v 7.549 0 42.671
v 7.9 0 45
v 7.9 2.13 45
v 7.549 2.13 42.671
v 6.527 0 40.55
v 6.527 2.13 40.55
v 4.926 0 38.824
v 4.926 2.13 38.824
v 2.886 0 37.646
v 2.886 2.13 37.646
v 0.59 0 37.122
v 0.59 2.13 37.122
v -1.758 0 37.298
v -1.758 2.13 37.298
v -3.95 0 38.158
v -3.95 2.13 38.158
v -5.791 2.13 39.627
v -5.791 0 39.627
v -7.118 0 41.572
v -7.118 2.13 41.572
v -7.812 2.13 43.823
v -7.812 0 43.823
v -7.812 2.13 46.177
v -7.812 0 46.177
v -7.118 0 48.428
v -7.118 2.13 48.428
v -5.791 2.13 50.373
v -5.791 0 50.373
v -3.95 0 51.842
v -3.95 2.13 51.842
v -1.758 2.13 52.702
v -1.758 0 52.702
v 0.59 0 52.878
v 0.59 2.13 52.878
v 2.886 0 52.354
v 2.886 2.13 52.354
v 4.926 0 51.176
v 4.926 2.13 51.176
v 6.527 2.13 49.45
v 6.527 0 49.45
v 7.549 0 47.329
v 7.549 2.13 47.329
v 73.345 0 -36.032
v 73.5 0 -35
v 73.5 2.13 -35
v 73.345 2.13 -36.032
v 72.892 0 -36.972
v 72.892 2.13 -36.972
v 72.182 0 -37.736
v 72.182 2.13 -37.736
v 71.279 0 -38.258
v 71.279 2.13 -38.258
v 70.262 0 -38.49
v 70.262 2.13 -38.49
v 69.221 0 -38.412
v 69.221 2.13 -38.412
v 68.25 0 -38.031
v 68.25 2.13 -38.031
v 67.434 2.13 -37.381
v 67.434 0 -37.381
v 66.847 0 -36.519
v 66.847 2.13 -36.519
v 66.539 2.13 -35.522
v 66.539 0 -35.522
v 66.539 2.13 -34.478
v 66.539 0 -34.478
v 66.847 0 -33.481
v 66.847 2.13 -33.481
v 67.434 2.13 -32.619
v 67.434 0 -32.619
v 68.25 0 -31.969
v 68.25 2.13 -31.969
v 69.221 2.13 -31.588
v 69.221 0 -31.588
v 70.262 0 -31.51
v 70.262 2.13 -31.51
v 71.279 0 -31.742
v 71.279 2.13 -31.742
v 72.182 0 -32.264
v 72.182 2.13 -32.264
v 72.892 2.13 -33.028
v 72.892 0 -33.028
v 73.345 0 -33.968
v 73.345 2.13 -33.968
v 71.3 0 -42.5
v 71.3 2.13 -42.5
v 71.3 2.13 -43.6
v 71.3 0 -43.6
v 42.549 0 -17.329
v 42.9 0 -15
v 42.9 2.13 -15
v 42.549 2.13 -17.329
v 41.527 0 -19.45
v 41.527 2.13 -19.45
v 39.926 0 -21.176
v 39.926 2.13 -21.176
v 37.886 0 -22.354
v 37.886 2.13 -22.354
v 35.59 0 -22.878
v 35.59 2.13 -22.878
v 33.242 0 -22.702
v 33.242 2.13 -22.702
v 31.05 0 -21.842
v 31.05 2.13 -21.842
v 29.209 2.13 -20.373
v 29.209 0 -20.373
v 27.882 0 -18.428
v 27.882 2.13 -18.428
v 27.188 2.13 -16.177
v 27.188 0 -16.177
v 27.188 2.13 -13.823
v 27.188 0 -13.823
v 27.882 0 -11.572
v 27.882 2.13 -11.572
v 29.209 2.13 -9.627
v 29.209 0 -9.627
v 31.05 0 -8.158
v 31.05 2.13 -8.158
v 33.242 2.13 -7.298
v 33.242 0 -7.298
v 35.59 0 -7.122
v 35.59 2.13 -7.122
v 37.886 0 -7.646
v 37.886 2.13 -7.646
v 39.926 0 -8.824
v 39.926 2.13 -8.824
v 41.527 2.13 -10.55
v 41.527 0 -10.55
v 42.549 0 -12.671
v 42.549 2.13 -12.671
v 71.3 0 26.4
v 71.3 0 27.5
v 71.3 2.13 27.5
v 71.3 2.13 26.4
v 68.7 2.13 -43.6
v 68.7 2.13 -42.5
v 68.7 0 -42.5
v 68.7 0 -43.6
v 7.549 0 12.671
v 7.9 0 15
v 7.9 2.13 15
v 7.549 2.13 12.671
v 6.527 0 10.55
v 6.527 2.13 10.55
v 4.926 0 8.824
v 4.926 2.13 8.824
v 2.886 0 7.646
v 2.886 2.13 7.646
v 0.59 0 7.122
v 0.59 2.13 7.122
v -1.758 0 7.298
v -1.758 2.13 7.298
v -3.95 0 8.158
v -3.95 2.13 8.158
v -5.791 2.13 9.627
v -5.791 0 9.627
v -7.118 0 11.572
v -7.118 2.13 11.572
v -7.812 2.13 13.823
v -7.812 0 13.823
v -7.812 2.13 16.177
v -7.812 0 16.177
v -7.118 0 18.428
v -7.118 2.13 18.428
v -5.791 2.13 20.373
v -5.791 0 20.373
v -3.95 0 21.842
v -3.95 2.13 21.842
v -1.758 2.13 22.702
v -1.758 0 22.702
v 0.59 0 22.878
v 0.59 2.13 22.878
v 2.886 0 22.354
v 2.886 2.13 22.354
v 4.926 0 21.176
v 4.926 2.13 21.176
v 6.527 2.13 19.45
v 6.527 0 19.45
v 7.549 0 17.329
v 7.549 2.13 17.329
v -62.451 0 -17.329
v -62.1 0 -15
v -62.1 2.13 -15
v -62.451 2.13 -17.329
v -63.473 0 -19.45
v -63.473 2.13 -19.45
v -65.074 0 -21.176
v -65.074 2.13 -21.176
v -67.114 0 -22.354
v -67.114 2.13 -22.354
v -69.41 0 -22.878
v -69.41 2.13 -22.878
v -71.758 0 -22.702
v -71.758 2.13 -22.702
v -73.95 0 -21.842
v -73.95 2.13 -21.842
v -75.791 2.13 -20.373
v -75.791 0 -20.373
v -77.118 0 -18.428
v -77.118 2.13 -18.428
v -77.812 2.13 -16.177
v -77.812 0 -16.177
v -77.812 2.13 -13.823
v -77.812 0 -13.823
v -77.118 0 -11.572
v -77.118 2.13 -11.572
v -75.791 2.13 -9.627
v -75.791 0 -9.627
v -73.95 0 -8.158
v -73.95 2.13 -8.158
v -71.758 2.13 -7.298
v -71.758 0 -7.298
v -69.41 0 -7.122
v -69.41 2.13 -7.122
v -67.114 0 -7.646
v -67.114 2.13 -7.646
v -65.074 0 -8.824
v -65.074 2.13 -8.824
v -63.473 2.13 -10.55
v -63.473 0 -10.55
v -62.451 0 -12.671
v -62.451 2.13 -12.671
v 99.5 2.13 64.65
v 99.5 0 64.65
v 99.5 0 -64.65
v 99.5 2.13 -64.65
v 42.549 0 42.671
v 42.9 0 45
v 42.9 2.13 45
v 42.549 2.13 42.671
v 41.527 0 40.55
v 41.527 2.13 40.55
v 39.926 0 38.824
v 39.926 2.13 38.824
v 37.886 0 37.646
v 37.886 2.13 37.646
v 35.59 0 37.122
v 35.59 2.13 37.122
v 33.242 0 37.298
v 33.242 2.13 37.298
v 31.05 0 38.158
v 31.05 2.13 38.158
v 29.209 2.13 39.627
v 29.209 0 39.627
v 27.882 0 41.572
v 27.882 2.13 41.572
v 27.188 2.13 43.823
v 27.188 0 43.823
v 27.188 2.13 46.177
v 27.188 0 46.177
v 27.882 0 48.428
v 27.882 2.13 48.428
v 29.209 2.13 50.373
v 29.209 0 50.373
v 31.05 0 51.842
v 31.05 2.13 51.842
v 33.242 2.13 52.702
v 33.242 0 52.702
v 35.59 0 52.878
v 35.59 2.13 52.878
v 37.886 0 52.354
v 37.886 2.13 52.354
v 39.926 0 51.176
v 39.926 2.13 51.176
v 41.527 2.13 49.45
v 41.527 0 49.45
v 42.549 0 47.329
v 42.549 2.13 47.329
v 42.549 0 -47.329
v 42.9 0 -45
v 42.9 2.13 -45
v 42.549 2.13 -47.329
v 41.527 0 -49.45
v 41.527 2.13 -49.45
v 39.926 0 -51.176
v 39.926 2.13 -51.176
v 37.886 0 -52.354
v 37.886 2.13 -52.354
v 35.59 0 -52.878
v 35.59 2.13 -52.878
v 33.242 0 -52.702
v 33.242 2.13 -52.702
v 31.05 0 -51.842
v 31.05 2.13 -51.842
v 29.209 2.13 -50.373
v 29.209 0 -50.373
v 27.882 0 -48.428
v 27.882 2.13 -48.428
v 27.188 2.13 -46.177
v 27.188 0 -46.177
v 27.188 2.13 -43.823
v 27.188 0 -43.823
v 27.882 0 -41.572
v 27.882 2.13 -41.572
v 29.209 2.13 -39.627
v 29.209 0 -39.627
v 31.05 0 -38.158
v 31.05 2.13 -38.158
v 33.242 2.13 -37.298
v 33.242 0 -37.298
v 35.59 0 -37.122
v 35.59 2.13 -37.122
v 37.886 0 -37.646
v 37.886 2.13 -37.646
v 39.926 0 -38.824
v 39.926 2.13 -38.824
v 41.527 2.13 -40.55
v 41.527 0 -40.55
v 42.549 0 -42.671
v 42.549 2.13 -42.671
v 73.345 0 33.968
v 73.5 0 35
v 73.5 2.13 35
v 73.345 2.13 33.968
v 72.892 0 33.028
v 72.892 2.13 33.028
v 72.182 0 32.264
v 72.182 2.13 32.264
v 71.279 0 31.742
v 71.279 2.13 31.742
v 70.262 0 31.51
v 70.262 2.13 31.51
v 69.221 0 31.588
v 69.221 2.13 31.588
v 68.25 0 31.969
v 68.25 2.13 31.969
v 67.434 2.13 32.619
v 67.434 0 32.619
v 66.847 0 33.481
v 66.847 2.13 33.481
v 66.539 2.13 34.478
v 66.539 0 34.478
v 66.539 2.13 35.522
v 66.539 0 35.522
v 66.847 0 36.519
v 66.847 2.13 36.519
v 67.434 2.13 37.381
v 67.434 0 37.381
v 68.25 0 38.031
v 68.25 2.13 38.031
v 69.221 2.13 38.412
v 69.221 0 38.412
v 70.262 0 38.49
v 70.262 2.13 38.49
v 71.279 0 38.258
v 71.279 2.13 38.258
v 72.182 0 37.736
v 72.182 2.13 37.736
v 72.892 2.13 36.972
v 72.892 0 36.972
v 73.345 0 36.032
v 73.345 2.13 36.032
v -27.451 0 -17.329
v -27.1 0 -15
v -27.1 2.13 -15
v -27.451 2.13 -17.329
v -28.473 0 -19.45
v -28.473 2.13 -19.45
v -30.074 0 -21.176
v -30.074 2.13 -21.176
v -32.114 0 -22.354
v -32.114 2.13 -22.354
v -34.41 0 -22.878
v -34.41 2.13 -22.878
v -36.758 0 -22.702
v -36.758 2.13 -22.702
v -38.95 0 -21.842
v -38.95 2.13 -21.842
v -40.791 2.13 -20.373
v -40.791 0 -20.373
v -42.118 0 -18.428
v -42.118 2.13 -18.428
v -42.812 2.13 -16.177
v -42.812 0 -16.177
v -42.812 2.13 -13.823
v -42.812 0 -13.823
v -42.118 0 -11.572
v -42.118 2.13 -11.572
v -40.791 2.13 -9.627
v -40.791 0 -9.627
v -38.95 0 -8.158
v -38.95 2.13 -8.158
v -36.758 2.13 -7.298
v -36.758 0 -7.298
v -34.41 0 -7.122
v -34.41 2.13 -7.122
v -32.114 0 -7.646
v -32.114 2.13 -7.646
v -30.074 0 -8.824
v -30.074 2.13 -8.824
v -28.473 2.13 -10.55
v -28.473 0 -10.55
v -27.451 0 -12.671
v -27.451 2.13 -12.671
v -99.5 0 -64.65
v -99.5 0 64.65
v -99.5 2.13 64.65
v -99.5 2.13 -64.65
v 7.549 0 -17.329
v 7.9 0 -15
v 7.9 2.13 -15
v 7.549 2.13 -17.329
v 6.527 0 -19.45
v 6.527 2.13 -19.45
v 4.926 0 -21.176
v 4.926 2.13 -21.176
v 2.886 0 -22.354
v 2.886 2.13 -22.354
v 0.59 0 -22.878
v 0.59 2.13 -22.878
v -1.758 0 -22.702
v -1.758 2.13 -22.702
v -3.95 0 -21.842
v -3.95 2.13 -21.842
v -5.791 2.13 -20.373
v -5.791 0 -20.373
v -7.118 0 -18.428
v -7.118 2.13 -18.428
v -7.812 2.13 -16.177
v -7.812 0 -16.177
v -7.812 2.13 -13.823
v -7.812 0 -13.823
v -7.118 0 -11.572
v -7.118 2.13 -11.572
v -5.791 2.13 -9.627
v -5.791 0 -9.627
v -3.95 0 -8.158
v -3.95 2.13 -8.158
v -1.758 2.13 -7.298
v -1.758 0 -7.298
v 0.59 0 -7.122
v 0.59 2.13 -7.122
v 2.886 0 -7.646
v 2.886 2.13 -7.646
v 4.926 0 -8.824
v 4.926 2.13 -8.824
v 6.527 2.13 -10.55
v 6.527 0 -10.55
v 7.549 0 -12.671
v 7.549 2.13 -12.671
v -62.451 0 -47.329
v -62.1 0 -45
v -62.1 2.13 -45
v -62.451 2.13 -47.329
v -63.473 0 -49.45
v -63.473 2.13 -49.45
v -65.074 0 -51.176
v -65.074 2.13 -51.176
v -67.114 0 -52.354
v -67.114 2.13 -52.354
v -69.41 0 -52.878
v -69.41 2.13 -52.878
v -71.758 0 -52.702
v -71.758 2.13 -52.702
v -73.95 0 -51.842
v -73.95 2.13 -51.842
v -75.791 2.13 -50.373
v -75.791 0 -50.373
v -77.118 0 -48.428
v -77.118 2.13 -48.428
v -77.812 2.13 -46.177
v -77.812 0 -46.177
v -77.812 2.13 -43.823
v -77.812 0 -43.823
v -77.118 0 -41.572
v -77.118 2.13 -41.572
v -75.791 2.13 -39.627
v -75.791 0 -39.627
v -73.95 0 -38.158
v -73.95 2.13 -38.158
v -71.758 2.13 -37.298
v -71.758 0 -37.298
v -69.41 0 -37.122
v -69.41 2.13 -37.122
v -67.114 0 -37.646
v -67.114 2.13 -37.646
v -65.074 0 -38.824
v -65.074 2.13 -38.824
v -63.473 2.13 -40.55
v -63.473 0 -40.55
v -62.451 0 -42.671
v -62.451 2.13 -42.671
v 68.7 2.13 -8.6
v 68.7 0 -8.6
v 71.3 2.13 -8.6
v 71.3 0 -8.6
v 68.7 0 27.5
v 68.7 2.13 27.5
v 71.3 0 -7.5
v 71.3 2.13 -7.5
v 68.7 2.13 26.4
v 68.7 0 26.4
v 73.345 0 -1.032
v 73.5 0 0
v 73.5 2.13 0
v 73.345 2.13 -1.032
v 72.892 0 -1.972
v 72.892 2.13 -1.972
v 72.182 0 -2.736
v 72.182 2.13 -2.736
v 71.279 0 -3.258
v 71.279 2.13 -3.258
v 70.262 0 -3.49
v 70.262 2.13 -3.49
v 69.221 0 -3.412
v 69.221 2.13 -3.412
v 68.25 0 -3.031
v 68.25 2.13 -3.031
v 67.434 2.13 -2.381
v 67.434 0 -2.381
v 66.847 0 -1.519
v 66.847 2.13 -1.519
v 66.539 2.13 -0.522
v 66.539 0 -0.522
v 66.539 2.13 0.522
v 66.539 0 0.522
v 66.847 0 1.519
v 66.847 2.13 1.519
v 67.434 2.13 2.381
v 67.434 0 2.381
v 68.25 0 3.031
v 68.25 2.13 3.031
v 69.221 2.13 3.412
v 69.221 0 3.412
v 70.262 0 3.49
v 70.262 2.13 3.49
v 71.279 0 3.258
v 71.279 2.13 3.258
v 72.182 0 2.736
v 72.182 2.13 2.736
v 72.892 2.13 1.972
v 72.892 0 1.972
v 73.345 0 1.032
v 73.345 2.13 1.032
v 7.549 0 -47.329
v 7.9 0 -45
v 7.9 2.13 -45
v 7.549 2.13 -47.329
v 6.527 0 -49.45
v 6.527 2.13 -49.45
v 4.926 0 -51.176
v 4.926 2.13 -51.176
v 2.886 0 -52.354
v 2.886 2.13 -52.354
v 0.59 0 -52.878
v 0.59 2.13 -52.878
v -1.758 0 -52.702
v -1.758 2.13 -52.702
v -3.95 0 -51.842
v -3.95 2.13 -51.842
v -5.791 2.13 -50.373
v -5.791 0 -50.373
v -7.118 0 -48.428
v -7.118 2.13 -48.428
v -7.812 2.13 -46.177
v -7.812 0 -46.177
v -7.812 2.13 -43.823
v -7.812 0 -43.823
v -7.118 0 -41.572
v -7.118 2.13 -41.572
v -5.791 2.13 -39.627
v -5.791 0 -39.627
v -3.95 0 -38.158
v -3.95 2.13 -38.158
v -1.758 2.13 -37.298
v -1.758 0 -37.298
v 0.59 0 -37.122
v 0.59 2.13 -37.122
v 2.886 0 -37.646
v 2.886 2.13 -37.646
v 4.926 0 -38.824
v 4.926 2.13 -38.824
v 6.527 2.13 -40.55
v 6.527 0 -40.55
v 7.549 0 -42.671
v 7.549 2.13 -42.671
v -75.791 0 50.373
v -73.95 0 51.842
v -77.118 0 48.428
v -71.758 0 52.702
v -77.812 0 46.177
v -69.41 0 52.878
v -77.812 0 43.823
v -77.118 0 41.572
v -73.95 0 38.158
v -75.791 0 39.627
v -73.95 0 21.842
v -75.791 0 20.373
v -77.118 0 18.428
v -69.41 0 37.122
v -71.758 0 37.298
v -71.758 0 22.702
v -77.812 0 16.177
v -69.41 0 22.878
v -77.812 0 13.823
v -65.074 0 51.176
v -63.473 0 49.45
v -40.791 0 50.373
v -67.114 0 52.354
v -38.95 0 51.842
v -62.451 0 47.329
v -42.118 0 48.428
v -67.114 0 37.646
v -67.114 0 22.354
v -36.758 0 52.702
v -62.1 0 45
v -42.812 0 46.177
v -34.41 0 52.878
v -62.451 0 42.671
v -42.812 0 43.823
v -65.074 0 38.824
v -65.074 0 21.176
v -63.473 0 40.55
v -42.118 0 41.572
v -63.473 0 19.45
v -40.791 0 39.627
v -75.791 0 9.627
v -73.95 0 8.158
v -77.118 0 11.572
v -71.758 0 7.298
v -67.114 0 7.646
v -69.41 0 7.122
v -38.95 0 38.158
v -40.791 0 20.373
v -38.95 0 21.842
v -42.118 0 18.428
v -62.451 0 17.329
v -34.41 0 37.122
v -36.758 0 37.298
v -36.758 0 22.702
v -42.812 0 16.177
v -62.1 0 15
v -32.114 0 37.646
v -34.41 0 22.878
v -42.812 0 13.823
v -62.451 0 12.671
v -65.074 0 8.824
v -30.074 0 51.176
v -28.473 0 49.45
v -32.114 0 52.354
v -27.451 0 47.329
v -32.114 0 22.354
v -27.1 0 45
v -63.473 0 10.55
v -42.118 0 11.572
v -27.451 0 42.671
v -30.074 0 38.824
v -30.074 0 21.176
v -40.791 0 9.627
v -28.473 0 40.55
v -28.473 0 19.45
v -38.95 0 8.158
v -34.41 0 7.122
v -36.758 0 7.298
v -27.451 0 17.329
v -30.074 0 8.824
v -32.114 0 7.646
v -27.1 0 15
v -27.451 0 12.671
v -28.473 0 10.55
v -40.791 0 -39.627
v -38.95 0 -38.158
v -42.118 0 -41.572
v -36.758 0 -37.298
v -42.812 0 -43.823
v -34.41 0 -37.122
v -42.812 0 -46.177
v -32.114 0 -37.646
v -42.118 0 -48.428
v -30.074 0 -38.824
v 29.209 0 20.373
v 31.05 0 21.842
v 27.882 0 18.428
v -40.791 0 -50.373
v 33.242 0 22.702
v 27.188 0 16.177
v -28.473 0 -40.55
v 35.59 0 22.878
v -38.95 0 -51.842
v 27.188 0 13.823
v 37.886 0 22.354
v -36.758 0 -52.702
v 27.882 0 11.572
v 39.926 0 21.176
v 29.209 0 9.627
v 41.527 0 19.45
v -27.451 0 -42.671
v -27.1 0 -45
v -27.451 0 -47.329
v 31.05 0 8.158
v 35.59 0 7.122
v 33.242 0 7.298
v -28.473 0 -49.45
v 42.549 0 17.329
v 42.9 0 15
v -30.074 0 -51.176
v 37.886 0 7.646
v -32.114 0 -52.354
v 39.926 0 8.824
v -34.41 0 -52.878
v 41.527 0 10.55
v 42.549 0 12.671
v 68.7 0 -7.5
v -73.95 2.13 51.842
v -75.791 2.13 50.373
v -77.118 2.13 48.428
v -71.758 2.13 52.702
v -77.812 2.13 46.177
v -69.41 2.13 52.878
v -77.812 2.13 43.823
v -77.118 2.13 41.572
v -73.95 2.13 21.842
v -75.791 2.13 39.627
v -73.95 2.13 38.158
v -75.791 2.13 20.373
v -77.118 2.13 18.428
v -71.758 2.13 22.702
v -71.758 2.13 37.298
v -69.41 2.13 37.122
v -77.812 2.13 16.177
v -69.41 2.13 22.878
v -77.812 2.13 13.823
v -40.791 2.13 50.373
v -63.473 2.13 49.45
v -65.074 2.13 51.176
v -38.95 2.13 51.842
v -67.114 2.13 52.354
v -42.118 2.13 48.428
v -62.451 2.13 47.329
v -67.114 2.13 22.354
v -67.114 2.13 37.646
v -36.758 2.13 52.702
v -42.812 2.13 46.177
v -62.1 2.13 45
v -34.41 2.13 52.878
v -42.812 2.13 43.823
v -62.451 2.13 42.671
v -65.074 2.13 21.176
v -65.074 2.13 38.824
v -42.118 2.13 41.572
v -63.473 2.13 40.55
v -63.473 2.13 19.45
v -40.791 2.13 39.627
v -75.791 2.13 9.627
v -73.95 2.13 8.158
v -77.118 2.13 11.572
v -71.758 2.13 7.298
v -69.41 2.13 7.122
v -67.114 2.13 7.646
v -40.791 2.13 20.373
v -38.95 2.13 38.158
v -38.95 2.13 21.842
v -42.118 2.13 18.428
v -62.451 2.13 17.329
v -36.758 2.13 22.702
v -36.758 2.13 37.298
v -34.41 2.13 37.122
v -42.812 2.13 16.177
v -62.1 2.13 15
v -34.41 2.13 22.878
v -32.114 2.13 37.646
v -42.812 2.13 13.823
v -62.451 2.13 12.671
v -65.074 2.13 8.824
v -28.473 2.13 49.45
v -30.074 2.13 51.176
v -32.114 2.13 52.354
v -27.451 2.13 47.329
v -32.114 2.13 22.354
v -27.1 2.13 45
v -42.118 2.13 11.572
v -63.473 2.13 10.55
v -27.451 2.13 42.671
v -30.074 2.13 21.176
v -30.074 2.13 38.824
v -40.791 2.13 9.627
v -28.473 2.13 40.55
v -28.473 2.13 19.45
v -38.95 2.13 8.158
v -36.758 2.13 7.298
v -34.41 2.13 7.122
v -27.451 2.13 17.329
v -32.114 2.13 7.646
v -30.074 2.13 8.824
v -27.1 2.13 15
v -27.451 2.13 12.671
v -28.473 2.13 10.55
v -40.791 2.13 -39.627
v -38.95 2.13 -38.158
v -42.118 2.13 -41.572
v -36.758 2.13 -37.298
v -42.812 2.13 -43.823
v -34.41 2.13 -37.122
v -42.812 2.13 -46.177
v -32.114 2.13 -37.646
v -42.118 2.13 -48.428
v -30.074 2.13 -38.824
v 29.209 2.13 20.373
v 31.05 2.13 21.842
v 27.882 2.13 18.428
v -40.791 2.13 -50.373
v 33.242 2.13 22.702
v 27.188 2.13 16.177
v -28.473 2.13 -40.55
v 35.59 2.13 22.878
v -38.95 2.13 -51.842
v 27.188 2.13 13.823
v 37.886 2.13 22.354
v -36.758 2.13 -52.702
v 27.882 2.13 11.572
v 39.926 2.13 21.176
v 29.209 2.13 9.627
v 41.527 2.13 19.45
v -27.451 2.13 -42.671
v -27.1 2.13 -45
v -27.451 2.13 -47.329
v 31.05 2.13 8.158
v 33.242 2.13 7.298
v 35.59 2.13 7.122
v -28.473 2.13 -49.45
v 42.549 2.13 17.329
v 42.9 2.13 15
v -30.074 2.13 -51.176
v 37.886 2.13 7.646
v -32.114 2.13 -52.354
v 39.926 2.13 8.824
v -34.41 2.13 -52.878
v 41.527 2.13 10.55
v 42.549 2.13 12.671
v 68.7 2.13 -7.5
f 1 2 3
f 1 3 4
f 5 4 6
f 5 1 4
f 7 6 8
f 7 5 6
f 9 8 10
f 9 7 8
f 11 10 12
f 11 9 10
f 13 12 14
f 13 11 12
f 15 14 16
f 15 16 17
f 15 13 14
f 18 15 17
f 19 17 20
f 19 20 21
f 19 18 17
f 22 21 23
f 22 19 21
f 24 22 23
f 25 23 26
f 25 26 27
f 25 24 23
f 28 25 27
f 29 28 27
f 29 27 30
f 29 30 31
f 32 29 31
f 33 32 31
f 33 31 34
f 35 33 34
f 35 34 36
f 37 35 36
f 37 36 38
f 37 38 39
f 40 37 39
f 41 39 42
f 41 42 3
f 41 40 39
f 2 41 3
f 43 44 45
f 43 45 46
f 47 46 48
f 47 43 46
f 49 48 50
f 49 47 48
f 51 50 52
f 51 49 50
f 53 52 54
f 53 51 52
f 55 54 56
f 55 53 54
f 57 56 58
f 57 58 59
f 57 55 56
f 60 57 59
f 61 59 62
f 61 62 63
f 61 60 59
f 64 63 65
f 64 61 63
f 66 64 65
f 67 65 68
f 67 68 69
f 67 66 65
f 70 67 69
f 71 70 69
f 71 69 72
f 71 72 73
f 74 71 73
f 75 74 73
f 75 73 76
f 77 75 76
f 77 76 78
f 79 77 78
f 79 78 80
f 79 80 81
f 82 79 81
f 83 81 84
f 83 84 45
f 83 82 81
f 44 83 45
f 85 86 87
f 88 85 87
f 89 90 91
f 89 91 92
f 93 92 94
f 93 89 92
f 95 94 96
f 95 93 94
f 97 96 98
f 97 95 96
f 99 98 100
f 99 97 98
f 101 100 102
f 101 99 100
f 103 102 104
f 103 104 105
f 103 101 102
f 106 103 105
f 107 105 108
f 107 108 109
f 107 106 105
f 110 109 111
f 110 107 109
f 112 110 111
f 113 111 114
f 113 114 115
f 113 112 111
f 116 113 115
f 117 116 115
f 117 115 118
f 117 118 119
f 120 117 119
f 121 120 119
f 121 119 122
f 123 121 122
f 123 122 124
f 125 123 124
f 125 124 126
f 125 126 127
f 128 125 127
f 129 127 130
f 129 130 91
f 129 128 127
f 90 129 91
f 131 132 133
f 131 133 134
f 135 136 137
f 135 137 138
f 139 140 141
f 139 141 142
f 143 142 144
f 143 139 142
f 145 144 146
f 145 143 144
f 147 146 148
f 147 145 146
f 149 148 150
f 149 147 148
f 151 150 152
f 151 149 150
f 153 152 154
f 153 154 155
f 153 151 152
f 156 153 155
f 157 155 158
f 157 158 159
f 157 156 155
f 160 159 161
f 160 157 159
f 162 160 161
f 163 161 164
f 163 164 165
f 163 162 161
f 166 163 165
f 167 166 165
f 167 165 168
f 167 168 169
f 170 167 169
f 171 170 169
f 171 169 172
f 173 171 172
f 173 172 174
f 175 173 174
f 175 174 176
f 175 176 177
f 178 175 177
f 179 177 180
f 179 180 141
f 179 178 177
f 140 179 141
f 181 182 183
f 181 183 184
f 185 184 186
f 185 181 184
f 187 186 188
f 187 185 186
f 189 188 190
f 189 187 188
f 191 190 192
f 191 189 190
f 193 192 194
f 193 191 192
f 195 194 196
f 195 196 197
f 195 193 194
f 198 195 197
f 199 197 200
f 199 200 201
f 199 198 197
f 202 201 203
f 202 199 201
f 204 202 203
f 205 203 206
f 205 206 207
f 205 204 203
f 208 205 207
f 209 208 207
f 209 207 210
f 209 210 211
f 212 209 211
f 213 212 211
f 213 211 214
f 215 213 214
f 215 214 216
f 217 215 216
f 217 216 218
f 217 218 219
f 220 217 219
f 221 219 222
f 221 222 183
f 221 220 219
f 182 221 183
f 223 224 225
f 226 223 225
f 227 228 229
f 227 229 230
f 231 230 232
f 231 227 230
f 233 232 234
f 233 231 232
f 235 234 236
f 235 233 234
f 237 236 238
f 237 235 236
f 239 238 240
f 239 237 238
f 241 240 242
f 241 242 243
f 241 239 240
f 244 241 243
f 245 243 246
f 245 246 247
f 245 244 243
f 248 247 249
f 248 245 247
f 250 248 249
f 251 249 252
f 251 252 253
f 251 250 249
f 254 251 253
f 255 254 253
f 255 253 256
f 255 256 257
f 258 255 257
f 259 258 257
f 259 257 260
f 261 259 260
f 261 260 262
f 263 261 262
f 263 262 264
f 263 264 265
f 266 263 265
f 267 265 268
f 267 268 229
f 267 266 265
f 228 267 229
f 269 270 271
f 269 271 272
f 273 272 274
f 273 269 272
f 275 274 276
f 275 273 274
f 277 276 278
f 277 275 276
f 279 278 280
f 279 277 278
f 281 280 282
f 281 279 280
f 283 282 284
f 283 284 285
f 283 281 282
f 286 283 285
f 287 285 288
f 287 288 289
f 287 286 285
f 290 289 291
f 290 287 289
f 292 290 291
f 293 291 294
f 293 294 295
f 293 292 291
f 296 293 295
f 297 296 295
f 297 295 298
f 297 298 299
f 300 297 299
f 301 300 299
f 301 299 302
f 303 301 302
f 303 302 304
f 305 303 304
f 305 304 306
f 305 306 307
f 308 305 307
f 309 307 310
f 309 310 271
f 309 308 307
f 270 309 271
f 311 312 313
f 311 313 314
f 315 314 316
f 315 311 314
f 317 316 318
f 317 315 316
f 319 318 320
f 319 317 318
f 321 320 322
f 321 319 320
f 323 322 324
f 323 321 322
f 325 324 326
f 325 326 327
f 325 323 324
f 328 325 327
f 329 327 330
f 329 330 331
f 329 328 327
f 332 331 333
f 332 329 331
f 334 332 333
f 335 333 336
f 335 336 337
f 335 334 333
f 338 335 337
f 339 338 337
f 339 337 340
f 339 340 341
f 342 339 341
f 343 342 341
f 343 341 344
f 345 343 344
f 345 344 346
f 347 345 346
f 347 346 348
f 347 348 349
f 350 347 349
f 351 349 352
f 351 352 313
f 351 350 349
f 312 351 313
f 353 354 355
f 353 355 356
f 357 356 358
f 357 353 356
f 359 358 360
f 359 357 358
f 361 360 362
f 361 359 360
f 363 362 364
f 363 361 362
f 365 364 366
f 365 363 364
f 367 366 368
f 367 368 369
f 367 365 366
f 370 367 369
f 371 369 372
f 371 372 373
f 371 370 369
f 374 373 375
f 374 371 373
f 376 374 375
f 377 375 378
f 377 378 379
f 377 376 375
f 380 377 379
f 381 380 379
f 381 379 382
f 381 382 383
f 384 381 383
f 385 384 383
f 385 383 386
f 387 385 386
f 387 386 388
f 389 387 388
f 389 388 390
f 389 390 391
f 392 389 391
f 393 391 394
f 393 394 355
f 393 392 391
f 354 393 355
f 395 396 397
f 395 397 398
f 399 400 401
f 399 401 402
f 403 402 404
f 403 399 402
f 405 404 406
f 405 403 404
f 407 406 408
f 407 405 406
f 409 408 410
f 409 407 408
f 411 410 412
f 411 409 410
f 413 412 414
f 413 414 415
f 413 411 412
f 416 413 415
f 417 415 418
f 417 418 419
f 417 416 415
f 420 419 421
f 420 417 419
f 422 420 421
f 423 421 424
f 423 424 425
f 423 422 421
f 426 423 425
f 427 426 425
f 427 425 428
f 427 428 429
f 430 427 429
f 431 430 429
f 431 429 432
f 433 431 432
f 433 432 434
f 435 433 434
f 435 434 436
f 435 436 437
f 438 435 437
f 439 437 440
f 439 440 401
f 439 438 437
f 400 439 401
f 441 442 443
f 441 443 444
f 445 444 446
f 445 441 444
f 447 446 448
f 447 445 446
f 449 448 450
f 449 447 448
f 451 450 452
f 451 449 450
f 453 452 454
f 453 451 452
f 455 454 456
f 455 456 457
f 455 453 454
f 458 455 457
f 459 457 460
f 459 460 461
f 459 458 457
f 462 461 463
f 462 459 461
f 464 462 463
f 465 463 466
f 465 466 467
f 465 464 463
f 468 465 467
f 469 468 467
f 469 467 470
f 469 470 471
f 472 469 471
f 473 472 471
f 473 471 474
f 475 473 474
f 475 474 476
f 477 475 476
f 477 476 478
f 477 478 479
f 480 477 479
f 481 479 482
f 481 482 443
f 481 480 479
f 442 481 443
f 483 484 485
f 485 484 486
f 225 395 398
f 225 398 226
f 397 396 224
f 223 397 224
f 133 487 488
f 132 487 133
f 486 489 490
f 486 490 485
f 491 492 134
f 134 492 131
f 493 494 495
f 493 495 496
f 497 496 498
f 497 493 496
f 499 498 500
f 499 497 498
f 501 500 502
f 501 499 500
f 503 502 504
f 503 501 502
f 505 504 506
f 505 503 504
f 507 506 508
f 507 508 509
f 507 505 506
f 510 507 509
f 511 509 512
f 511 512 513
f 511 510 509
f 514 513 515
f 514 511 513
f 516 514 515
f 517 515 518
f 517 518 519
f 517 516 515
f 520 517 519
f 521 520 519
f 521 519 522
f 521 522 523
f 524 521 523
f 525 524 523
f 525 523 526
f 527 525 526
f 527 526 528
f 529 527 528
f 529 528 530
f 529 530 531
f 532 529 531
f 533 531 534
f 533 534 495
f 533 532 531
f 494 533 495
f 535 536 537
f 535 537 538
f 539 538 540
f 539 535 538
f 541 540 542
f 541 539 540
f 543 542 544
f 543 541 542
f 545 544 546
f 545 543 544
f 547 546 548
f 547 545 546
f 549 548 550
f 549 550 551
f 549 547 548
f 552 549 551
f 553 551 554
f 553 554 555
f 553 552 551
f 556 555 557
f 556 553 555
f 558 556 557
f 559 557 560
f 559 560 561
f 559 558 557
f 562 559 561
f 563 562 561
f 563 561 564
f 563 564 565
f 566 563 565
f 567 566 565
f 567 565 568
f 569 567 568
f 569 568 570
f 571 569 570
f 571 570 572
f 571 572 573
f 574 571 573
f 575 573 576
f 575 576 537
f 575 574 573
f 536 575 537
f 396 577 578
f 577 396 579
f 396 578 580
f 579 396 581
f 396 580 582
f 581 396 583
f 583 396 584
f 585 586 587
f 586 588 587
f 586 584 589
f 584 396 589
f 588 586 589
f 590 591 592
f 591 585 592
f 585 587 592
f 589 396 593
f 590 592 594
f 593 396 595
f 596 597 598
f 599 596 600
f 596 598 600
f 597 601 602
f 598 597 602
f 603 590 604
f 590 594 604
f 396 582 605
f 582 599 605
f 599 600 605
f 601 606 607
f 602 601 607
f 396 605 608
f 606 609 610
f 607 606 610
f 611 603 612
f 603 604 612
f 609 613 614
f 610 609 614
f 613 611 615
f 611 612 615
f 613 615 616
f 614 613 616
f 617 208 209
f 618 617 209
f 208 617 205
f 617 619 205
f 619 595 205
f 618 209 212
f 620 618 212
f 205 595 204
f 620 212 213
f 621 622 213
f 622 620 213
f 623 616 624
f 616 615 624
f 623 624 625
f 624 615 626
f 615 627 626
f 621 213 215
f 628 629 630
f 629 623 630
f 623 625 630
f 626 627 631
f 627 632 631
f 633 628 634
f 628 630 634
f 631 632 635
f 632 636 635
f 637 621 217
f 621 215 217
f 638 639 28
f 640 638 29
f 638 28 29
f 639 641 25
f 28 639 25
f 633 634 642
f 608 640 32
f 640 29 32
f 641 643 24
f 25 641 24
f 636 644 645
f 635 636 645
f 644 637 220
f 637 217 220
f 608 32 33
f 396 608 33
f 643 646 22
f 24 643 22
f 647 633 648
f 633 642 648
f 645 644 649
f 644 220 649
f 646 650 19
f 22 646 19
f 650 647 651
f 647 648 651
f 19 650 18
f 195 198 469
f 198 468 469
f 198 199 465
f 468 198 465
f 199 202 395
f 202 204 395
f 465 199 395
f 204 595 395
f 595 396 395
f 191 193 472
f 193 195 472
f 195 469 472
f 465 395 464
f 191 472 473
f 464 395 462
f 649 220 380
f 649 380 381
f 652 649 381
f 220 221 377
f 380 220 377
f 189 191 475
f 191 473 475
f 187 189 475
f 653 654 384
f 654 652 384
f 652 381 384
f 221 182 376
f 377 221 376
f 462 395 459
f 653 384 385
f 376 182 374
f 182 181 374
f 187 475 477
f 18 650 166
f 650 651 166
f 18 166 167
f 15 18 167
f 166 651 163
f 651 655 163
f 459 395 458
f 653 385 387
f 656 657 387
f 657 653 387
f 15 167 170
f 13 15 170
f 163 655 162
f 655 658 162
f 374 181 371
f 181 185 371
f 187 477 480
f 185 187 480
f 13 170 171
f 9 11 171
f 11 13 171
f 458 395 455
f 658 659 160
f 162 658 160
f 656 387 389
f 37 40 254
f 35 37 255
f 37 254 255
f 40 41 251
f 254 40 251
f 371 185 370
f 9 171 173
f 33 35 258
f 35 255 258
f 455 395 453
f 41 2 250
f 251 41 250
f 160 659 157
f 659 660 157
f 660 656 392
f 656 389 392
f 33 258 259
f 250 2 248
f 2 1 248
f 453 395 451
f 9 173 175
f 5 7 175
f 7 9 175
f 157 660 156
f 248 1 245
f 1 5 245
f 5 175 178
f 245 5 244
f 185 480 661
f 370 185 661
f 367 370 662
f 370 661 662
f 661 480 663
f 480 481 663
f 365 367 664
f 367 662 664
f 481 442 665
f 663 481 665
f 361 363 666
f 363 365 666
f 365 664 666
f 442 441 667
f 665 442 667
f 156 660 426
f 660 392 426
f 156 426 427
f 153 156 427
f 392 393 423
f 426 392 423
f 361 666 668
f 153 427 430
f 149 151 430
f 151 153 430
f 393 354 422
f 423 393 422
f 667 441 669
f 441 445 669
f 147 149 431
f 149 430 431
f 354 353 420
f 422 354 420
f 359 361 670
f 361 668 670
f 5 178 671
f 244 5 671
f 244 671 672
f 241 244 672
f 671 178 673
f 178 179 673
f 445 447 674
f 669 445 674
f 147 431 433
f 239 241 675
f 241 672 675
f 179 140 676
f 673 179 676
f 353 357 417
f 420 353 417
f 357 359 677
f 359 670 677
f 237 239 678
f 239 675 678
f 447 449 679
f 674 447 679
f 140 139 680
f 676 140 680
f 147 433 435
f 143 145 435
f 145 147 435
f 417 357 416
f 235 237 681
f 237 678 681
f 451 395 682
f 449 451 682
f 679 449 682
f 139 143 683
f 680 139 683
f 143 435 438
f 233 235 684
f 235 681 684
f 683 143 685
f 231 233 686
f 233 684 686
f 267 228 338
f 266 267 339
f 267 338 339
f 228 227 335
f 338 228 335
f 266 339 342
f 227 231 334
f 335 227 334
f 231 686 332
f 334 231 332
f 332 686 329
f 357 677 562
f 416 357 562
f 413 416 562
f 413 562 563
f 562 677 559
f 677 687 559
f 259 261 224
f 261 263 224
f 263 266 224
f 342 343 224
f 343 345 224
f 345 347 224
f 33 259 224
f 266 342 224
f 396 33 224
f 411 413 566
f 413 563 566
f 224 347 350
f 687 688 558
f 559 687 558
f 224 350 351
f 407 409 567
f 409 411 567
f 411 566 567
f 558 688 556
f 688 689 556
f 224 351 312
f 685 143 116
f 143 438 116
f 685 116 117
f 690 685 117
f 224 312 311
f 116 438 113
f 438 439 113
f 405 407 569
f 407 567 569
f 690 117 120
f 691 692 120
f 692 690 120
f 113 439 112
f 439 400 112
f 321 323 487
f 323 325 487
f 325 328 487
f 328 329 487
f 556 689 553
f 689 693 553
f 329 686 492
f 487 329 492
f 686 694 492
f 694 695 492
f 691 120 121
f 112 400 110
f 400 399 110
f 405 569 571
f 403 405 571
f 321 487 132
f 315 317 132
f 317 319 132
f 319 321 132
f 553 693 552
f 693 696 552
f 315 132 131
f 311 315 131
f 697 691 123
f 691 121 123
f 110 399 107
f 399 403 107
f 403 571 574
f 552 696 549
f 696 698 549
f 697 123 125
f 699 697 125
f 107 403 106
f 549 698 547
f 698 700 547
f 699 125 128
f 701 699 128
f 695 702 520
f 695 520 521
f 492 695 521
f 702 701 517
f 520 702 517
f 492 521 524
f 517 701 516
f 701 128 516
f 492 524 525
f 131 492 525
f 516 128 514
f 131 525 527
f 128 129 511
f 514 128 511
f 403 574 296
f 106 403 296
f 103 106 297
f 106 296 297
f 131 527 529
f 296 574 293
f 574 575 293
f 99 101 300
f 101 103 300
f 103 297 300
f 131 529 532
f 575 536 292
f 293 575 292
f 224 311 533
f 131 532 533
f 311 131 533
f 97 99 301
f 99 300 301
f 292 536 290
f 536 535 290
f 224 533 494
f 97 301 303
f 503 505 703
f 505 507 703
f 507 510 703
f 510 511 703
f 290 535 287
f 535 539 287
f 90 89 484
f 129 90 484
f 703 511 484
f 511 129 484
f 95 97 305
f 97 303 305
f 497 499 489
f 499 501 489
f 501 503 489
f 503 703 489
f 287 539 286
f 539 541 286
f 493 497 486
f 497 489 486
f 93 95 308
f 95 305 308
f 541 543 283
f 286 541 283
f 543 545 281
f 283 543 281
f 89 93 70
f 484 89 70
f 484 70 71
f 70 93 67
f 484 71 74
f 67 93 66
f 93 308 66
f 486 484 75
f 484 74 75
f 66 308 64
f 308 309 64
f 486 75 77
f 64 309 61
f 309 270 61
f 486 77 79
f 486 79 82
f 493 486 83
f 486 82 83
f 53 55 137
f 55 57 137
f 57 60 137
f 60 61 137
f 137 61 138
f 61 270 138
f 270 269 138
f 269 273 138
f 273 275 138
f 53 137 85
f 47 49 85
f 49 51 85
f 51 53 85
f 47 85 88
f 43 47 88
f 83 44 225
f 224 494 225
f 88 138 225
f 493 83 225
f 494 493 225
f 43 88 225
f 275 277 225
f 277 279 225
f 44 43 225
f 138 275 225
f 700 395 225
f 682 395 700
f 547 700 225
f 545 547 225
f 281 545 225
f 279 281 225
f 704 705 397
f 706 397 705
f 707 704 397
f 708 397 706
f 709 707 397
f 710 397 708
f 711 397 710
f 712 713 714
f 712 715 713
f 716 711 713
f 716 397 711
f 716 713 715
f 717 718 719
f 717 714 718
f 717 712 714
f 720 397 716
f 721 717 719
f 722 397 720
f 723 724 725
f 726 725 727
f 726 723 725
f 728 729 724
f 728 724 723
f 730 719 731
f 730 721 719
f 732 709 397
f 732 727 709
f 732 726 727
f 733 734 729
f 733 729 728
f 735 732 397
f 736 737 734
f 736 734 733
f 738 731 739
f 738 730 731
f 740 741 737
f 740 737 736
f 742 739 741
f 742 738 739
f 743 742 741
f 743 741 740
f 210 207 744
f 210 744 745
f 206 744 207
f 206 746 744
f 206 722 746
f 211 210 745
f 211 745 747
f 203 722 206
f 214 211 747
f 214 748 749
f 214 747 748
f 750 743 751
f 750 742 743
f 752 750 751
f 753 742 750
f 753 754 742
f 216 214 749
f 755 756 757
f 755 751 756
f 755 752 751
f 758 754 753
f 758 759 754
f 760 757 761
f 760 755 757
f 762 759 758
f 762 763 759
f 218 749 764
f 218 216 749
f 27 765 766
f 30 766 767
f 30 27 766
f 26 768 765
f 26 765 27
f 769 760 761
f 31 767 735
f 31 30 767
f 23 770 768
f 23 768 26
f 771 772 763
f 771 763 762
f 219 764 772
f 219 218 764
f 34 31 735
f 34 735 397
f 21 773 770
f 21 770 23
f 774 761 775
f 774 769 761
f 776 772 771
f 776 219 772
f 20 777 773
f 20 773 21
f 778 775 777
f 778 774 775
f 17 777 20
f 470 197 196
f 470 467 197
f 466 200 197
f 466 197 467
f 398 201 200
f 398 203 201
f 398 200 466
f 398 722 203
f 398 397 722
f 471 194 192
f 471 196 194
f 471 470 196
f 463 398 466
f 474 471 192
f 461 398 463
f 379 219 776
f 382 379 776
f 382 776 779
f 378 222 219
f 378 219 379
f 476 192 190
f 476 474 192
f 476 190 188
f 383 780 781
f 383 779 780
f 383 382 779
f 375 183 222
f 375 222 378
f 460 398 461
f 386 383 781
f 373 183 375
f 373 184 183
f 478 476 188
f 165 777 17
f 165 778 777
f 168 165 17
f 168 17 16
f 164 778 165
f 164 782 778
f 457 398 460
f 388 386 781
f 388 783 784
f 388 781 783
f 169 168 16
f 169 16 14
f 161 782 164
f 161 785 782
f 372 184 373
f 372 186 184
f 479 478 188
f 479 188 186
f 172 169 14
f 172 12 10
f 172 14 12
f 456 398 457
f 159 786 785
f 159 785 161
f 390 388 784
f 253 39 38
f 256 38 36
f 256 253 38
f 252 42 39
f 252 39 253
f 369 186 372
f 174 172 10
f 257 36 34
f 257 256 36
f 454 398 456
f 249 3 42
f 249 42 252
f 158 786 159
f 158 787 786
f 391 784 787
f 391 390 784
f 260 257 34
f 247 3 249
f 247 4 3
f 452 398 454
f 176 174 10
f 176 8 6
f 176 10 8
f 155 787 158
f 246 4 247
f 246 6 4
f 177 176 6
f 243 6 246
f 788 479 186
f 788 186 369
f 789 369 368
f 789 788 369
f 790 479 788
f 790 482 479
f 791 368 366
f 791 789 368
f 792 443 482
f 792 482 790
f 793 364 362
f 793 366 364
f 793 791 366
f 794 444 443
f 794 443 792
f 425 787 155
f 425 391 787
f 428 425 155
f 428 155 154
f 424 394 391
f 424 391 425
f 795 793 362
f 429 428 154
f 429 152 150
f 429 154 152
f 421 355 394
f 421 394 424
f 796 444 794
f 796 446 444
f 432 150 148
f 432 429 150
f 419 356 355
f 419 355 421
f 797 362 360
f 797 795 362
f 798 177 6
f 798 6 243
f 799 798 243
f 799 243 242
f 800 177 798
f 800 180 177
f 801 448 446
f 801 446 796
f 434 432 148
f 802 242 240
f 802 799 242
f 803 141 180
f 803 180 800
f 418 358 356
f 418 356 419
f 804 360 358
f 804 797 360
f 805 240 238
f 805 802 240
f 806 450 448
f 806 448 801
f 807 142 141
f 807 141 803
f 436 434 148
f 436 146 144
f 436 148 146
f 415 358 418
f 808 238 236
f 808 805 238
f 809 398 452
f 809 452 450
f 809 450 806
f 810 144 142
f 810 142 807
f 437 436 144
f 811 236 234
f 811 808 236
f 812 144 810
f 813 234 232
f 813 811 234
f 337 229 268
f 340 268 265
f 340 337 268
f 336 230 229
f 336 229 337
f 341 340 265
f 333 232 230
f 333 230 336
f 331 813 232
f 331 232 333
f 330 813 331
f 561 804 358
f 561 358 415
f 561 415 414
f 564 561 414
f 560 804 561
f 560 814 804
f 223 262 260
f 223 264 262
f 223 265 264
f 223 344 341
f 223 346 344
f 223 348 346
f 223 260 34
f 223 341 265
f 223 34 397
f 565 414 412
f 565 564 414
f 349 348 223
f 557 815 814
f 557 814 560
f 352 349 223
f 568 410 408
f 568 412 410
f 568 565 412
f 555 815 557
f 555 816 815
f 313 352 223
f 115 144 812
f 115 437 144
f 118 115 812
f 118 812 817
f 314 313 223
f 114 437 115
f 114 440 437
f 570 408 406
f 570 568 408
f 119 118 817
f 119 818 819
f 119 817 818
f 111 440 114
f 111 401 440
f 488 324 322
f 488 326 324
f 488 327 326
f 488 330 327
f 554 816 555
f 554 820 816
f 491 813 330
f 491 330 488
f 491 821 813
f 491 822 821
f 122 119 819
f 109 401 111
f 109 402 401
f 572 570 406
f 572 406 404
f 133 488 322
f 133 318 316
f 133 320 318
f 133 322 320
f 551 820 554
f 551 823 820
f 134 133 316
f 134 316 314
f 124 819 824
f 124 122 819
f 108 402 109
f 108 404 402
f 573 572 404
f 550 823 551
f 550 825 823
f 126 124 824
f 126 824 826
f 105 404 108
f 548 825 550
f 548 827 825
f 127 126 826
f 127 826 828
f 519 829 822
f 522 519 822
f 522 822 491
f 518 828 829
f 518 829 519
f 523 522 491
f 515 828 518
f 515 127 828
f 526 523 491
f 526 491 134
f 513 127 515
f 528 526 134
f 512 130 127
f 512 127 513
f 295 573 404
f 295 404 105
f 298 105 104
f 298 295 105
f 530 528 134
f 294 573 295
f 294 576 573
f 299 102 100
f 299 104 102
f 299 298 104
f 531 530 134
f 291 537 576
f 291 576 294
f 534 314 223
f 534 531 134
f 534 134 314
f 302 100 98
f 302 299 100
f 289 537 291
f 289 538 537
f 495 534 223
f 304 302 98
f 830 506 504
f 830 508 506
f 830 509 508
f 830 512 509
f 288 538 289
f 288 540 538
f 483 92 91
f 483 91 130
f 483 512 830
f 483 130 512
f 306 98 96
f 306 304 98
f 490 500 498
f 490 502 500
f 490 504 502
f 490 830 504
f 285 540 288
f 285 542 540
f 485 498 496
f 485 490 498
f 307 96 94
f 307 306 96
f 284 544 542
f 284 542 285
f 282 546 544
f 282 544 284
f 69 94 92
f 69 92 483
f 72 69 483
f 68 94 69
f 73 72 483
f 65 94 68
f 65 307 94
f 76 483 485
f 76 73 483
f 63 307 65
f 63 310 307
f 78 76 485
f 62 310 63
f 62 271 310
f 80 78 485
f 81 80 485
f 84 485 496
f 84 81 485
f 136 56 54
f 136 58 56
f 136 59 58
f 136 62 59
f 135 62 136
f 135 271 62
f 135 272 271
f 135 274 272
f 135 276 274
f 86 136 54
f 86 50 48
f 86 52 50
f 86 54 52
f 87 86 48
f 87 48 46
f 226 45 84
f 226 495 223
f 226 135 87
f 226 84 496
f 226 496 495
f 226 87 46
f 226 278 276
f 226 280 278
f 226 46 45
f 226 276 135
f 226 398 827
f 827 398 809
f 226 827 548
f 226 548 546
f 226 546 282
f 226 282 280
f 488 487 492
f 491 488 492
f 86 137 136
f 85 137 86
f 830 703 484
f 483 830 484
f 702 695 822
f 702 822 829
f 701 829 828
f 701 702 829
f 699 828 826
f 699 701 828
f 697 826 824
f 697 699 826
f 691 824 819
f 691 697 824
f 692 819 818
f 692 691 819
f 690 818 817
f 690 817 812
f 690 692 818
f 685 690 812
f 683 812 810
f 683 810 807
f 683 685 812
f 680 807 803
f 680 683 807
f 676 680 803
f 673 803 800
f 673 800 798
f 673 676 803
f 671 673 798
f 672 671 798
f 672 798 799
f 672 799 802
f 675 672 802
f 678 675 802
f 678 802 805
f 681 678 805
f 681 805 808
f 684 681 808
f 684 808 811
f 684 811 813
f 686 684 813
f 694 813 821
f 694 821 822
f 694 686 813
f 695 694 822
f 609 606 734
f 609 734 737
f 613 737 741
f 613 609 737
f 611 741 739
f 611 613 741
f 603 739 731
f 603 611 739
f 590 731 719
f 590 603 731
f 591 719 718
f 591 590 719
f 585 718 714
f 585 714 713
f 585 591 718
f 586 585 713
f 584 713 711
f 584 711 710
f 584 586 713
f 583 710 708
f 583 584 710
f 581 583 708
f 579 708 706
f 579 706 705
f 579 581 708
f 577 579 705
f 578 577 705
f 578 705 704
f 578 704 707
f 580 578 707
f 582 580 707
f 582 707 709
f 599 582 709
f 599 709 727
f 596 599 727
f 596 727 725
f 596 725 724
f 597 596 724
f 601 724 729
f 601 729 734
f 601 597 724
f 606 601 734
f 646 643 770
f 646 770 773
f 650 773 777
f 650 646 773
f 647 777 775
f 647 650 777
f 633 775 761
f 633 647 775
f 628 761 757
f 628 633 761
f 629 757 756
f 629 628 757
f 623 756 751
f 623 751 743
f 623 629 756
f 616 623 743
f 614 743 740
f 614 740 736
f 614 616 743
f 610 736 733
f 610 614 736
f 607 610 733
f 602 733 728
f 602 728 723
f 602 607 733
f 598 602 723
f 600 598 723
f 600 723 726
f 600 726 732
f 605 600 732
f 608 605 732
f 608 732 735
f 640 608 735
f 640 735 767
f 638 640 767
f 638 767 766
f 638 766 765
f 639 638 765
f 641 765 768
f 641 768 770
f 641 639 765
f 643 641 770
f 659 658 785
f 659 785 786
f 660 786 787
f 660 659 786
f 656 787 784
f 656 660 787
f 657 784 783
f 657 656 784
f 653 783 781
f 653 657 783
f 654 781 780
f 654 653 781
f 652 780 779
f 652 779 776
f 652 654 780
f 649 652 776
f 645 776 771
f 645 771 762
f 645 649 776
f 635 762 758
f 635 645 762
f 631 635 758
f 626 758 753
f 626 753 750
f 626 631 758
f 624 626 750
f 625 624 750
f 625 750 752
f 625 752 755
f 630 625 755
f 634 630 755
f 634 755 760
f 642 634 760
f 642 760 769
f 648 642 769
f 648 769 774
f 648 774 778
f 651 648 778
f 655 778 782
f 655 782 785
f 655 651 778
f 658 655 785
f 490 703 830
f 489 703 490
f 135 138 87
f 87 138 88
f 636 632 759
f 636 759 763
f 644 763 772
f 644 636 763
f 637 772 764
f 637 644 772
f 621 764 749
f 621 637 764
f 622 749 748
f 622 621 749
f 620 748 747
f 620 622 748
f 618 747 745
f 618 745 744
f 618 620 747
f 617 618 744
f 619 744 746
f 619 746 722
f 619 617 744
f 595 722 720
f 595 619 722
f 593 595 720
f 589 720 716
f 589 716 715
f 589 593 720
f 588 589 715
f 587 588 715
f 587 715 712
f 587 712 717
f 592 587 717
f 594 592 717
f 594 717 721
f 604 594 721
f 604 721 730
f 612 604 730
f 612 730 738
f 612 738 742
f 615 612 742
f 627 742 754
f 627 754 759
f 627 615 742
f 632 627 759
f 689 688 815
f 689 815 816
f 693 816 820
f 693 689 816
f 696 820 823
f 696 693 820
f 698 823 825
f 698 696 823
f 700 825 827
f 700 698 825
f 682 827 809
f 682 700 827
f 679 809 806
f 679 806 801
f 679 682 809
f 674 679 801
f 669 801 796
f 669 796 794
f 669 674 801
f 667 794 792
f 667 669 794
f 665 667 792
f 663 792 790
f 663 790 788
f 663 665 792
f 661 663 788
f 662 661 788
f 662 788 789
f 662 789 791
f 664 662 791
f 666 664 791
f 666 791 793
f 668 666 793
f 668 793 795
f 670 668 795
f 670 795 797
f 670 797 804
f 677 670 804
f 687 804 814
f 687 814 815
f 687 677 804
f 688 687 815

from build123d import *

# Parameters (mm, degrees)
SKETCH1_W           = 199
SKETCH1_H           = 129.3
SKETCH1_R           = 7.9
SKETCH1_R_2         = 3.5
SKETCH1_W_2         = 2.6
SKETCH1_H_2         = 1.1
BOSS_EXTRUDE1_DEPTH = 2.13


with BuildPart() as part:
    # Sketch1 → Boss-Extrude1 (new body)
    with BuildSketch(Plane(origin=(0, 0, 0), x_dir=(1, 0, 0), z_dir=(0, 1, 0))):
        Rectangle(SKETCH1_W, SKETCH1_H)
        with Locations((-70, 45)):
            Circle(SKETCH1_R, mode=Mode.SUBTRACT)
        with Locations((-35, 45)):
            Circle(SKETCH1_R, mode=Mode.SUBTRACT)
        with Locations((0, 45)):
            Circle(SKETCH1_R, mode=Mode.SUBTRACT)
        with Locations((35, 45)):
            Circle(SKETCH1_R, mode=Mode.SUBTRACT)
        with Locations((-35, 15)):
            Circle(SKETCH1_R, mode=Mode.SUBTRACT)
        with Locations((0, 15)):
            Circle(SKETCH1_R, mode=Mode.SUBTRACT)
        with Locations((35, 15)):
            Circle(SKETCH1_R, mode=Mode.SUBTRACT)
        with Locations((-35, -15)):
            Circle(SKETCH1_R, mode=Mode.SUBTRACT)
        with Locations((0, -15)):
            Circle(SKETCH1_R, mode=Mode.SUBTRACT)
        with Locations((35, -15)):
            Circle(SKETCH1_R, mode=Mode.SUBTRACT)
        with Locations((-35, -45)):
            Circle(SKETCH1_R, mode=Mode.SUBTRACT)
        with Locations((0, -45)):
            Circle(SKETCH1_R, mode=Mode.SUBTRACT)
        with Locations((35, -45)):
            Circle(SKETCH1_R, mode=Mode.SUBTRACT)
        with Locations((-70, 15)):
            Circle(SKETCH1_R, mode=Mode.SUBTRACT)
        with Locations((-70, -15)):
            Circle(SKETCH1_R, mode=Mode.SUBTRACT)
        with Locations((-70, -45)):
            Circle(SKETCH1_R, mode=Mode.SUBTRACT)
        with Locations((70, 35)):
            Circle(SKETCH1_R_2, mode=Mode.SUBTRACT)
        with Locations((70, 0)):
            Circle(SKETCH1_R_2, mode=Mode.SUBTRACT)
        with Locations((70, -35)):
            Circle(SKETCH1_R_2, mode=Mode.SUBTRACT)
        with Locations((70, 43.05)):
            Rectangle(SKETCH1_W_2, SKETCH1_H_2, mode=Mode.SUBTRACT)
        with Locations((70, 8.05)):
            Rectangle(SKETCH1_W_2, SKETCH1_H_2, mode=Mode.SUBTRACT)
        with Locations((70, -26.95)):
            Rectangle(SKETCH1_W_2, SKETCH1_H_2, mode=Mode.SUBTRACT)
    extrude(amount=BOSS_EXTRUDE1_DEPTH)


solid = part.part
